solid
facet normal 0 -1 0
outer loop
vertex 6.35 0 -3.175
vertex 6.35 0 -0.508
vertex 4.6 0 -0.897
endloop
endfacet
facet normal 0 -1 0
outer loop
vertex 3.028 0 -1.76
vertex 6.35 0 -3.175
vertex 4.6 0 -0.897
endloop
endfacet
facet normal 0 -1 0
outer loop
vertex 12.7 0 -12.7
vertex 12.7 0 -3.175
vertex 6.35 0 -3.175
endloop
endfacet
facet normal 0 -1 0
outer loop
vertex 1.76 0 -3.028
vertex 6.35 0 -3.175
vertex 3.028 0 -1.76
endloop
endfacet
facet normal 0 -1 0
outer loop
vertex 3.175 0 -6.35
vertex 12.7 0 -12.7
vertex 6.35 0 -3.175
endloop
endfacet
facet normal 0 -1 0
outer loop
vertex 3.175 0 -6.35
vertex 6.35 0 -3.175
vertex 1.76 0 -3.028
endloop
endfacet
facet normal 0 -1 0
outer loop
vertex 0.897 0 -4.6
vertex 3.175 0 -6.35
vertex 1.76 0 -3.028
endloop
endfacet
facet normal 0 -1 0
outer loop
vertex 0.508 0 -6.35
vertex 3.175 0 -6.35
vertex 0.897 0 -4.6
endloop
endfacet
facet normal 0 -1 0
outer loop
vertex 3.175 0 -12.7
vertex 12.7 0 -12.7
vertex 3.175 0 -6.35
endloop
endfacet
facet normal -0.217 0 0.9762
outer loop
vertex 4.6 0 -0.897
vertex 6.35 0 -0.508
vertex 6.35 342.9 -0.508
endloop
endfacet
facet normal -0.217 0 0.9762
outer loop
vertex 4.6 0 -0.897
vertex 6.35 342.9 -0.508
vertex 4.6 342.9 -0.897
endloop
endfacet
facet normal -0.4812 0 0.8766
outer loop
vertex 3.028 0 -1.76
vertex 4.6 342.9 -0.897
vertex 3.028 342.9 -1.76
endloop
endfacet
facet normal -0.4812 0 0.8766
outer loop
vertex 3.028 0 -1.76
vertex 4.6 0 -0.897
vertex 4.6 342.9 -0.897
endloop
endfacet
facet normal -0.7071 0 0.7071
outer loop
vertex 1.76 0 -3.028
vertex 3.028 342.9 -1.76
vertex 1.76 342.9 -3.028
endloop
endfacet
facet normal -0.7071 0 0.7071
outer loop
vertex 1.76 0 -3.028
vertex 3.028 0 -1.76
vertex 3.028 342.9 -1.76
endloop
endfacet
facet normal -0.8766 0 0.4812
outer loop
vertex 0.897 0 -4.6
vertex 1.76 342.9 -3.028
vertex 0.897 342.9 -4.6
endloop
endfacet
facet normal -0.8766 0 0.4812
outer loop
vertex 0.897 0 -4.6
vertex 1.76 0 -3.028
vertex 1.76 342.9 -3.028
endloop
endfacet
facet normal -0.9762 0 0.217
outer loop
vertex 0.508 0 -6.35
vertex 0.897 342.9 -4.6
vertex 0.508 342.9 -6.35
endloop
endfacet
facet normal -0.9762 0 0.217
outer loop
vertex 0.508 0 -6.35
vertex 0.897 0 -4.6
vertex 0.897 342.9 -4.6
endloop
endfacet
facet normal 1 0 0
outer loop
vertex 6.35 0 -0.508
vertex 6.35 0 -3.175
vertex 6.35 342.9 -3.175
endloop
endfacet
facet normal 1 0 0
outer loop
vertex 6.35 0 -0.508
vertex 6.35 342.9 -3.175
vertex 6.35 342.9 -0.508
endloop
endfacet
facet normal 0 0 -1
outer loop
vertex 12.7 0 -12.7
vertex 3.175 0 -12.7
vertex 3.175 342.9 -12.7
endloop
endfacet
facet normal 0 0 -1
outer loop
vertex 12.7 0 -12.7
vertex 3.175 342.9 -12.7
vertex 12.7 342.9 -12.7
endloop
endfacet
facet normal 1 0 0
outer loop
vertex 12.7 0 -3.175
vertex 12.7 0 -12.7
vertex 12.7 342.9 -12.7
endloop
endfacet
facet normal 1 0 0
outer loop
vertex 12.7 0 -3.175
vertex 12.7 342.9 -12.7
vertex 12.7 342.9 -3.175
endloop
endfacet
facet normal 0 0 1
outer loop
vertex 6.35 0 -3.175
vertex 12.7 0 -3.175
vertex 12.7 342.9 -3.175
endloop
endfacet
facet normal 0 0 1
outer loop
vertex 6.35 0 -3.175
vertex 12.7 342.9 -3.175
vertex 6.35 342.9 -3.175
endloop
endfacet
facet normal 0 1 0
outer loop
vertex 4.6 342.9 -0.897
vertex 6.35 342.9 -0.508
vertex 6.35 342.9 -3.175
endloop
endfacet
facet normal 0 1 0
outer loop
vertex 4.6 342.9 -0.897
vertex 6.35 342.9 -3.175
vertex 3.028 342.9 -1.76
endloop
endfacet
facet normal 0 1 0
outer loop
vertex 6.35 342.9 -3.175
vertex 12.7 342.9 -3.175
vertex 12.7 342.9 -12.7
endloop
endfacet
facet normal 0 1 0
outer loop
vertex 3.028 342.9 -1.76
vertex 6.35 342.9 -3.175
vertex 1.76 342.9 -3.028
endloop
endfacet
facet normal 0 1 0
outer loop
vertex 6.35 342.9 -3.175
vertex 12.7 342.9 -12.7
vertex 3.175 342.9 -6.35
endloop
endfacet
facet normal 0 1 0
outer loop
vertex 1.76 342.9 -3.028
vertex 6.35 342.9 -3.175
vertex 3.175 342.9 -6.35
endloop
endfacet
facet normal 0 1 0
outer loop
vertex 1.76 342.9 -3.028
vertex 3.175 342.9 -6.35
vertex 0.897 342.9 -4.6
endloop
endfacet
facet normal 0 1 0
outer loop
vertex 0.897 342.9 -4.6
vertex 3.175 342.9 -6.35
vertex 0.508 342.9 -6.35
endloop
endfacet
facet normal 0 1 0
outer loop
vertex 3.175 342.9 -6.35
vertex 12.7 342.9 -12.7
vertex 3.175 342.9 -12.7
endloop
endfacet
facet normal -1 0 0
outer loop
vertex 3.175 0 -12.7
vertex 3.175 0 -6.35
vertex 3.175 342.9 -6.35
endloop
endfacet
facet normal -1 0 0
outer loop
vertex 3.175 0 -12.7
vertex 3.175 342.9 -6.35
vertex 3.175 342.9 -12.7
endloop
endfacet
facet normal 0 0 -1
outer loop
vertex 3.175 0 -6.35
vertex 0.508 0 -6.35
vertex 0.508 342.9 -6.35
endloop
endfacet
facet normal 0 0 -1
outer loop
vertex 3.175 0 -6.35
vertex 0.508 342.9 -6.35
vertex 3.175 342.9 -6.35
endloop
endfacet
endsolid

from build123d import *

# Parameters (mm, degrees)
BOSS_EXTRUDE1_DEPTH = 342.9


with BuildPart() as part:
    # Sketch1 → Boss-Extrude1 (new body)
    with BuildSketch(Plane(origin=(0, 0, 0), x_dir=(1, 0, 0), z_dir=(0, 1, 0))):
        with BuildLine():
            Line((3.175, 12.7), (12.7, 12.7))
            Line((12.7, 12.7), (12.7, 3.175))
            Line((12.7, 3.175), (6.35, 3.175))
            Line((6.35, 3.175), (6.35, 0.508))
            ThreePointArc((6.35, 0.508), (2.349005221, 2.349005221), (0.508, 6.35))
            Line((0.508, 6.35), (3.175, 6.35))
            Line((3.175, 6.35), (3.175, 12.7))
        make_face()
    extrude(amount=BOSS_EXTRUDE1_DEPTH)


solid = part.part
